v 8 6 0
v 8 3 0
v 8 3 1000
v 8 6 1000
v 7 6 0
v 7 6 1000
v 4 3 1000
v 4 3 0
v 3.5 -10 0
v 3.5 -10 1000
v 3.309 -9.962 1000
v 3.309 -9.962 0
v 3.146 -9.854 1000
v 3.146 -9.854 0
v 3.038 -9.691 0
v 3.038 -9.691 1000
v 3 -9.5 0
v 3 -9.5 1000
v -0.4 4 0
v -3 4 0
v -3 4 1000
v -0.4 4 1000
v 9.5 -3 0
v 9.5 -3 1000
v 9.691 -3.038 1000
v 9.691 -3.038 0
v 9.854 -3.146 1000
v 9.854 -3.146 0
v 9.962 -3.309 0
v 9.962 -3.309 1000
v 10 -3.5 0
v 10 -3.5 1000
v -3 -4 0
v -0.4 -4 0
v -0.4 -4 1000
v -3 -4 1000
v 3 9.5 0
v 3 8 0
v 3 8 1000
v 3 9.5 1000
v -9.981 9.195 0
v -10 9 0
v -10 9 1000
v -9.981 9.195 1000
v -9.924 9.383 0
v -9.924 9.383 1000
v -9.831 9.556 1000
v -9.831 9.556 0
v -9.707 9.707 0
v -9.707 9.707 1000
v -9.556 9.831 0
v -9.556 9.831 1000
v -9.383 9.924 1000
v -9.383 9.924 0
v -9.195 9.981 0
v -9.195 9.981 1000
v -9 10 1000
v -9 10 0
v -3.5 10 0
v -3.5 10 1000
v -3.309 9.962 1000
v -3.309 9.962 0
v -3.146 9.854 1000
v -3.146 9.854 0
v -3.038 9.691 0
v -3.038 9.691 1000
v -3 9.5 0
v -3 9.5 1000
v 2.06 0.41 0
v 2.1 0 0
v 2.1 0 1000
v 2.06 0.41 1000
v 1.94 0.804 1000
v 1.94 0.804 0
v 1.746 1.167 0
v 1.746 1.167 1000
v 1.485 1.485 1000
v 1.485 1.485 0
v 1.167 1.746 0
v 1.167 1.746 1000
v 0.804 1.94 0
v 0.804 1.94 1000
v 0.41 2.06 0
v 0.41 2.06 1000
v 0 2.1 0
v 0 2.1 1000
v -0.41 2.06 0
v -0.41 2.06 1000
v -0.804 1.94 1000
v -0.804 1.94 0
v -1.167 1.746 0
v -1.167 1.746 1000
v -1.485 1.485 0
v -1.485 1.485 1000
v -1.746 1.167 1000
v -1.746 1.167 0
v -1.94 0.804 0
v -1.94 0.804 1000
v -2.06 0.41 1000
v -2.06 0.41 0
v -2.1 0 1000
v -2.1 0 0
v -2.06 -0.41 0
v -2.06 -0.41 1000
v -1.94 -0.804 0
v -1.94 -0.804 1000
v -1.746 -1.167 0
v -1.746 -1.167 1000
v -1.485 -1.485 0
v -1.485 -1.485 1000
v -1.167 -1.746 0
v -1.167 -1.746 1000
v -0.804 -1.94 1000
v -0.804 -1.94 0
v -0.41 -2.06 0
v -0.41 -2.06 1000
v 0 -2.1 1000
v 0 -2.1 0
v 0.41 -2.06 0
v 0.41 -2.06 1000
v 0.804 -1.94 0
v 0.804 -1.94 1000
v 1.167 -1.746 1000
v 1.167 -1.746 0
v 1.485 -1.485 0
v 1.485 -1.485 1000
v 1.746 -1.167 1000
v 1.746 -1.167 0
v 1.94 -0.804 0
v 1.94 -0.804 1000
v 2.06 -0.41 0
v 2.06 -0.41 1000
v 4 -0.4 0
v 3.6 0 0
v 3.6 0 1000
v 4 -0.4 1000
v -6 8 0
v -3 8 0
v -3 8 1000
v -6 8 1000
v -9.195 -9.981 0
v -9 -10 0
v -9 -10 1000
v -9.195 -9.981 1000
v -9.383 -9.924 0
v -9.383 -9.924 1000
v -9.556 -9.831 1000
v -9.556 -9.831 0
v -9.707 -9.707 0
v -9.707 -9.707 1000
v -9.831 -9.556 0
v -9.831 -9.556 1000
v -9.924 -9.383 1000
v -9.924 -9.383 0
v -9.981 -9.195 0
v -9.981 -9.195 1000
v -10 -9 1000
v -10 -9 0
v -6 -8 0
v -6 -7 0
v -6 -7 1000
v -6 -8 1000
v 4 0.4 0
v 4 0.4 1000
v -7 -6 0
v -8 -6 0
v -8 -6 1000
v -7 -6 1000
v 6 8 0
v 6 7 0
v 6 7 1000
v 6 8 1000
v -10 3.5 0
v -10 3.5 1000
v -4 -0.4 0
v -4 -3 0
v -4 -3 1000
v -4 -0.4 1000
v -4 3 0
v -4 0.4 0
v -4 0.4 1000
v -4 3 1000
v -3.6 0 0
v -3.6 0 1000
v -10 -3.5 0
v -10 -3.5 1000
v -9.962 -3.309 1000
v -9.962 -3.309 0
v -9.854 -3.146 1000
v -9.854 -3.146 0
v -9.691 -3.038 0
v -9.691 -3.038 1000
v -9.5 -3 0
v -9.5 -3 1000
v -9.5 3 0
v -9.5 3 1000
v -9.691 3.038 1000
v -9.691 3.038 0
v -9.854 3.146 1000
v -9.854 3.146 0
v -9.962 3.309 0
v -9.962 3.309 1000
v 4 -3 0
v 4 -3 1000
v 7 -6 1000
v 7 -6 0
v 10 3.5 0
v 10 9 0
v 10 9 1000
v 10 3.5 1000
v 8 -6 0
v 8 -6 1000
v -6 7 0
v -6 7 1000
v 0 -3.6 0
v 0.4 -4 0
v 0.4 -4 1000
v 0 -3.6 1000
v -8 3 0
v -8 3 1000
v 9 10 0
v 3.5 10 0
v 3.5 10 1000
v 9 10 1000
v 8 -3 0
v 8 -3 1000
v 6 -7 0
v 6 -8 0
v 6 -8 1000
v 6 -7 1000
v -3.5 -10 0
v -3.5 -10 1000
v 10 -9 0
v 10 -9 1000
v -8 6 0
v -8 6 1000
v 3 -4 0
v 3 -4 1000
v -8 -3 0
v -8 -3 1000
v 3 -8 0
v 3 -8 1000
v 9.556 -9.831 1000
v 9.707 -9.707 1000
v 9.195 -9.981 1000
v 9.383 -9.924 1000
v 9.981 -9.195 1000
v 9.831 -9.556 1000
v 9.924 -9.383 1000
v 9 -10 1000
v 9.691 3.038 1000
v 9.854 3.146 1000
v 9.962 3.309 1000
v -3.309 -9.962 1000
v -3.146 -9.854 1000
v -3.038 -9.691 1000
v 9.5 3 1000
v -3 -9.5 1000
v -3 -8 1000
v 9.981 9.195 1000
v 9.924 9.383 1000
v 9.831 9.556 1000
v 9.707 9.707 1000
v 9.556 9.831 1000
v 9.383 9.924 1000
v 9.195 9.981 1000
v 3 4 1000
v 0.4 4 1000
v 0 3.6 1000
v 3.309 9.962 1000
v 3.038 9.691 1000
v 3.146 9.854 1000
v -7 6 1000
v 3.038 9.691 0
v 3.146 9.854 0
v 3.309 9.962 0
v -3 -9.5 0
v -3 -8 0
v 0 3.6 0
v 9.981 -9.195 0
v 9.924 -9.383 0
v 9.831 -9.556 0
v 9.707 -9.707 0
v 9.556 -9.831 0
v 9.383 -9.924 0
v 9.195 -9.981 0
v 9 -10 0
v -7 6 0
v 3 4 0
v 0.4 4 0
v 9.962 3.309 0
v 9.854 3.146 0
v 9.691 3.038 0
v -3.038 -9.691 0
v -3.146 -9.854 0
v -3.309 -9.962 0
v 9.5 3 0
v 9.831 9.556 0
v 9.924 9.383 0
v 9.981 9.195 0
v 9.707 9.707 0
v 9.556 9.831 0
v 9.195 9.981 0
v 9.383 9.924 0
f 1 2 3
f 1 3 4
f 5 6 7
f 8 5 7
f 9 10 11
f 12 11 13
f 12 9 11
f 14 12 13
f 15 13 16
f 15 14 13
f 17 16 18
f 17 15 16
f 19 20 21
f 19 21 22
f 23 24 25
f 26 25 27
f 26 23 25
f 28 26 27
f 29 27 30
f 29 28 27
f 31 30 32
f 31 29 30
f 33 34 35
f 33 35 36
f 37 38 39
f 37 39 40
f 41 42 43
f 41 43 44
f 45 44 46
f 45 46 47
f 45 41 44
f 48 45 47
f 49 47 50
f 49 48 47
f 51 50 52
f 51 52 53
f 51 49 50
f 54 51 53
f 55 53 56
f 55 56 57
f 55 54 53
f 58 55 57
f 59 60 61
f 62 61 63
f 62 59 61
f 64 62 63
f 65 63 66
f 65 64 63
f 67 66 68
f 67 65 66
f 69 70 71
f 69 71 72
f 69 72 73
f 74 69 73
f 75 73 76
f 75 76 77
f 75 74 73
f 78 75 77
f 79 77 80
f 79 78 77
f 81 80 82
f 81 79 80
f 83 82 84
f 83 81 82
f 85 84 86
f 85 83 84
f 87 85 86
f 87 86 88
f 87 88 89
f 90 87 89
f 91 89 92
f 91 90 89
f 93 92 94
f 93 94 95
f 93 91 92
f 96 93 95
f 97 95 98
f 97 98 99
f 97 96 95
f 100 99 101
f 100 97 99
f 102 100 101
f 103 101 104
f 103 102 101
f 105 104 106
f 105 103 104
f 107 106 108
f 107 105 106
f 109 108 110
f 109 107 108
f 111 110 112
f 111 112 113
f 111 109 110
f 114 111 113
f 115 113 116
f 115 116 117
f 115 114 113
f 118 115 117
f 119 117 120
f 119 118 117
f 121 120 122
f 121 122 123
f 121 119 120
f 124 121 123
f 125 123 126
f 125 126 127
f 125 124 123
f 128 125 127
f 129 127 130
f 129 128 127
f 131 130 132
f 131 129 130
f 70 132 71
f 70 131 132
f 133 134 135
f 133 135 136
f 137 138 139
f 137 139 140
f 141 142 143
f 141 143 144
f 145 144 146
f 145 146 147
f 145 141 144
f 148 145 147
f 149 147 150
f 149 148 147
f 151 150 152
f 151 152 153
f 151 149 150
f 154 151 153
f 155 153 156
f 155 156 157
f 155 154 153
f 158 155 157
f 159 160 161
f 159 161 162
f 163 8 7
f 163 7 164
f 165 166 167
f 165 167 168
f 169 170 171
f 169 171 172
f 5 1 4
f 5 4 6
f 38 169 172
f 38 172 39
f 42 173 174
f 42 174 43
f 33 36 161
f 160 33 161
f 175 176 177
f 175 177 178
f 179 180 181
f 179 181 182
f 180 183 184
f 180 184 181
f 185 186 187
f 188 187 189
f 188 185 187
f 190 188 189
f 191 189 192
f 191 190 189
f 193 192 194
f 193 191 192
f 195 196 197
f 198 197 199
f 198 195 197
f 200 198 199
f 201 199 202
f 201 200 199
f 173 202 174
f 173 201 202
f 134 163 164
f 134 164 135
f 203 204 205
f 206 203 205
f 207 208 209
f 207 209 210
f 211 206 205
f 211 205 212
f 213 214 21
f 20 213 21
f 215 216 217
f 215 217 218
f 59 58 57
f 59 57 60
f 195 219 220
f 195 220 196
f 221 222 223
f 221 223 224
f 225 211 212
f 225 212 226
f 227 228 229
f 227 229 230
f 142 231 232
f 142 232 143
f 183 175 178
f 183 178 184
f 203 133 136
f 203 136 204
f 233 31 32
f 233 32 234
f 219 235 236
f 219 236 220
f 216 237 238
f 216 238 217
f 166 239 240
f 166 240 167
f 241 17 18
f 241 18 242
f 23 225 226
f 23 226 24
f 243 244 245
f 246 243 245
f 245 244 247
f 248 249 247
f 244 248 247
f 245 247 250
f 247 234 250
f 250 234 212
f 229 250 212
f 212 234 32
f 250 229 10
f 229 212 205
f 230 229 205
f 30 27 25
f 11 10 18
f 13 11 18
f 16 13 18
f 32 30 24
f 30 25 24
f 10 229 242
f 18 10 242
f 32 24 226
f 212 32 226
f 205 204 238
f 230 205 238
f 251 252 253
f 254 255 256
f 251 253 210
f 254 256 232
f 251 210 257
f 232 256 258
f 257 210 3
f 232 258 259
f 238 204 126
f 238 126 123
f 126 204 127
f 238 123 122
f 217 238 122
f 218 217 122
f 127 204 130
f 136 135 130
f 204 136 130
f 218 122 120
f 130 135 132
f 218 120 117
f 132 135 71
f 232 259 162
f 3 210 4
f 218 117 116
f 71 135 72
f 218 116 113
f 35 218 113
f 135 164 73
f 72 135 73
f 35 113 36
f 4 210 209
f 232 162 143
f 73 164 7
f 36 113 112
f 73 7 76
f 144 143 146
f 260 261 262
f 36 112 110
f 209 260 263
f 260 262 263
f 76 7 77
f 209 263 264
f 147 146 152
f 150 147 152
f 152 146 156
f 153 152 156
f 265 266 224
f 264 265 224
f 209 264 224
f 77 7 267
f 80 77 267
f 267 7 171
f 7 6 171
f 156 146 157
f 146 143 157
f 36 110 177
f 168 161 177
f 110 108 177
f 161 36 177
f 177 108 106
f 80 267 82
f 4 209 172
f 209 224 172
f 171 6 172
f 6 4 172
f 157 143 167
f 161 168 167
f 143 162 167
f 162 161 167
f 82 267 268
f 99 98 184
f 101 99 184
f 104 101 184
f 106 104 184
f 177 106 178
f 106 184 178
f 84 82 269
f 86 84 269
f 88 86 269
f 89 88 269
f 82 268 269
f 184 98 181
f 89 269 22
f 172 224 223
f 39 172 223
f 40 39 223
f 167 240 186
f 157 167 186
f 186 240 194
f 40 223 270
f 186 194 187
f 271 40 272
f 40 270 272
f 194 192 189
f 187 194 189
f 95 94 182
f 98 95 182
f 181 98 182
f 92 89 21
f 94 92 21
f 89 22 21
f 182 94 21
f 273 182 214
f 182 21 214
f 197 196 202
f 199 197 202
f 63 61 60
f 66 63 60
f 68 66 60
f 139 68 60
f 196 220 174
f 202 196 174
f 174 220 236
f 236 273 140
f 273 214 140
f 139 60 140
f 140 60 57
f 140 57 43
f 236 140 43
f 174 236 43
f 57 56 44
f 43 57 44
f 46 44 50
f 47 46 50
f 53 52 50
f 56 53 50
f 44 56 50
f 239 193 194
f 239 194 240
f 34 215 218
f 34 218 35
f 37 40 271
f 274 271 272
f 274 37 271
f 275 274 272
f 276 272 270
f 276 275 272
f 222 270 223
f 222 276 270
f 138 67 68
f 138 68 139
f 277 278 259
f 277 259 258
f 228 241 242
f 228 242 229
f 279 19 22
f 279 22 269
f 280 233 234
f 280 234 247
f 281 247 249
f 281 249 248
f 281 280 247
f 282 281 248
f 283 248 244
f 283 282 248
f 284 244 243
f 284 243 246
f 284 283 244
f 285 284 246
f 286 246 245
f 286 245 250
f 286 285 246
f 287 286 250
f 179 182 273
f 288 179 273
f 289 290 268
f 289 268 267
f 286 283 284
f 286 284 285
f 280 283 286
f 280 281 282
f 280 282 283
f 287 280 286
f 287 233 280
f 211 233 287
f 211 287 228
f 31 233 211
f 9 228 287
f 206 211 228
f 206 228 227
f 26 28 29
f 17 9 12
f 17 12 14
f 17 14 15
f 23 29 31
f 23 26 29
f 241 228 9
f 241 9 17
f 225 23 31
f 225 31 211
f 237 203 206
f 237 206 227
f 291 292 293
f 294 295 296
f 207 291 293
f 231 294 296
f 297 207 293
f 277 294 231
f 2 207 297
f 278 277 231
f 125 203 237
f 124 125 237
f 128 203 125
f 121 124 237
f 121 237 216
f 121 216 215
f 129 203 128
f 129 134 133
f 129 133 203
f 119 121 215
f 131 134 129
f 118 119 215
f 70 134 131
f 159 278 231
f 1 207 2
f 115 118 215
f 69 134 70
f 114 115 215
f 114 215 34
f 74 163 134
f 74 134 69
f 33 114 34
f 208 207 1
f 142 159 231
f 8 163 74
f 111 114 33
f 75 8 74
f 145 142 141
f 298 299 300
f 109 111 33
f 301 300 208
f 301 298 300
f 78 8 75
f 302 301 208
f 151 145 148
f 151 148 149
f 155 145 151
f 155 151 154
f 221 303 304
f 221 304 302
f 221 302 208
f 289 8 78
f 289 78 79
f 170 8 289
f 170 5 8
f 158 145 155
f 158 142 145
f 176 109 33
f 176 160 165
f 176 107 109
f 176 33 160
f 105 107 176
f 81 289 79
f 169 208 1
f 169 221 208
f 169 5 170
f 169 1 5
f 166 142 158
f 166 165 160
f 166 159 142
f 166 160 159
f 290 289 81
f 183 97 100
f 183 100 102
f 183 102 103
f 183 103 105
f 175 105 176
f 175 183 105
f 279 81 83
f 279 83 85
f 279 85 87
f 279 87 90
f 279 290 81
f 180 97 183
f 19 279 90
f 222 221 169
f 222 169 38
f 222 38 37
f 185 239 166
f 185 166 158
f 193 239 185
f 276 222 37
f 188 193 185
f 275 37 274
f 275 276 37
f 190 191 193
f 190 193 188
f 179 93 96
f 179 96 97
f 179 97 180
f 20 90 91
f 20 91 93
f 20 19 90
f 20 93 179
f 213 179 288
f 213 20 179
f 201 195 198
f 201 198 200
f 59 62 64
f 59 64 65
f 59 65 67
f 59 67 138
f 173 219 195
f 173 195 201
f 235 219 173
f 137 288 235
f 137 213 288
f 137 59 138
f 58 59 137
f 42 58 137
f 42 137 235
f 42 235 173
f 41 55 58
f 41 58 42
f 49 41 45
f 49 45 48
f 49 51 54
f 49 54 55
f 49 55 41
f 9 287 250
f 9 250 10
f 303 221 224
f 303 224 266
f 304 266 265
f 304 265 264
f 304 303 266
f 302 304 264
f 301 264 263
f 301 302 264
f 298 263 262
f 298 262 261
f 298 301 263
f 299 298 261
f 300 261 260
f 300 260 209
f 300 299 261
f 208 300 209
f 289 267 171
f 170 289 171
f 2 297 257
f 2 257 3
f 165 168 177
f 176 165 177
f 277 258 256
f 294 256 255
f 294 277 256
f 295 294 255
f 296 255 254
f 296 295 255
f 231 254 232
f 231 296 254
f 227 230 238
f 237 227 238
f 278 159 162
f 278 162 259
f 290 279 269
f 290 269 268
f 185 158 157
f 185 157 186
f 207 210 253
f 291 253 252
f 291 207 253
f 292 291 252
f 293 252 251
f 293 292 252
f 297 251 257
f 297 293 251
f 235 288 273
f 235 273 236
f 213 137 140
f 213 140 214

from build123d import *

# Parameters (mm, degrees)
SCHIZZO1_R                   = 2.1
ESTRUSIONE_ESTRUSIONE1_DEPTH = 1000


with BuildPart() as part:
    # Schizzo1 → Estrusione-Estrusione1 (new body)
    with BuildSketch(Plane.XY):
        with BuildLine():
            Line((-3.6, 0), (-4, 0.4))
            Line((-4, 0.4), (-4, 3))
            Line((-4, 3), (-7, 6))
            Line((-7, 6), (-8, 6))
            Line((-8, 6), (-8, 3))
            Line((-8, 3), (-9.5, 3))
            ThreePointArc((-9.5, 3), (-9.853553391, 3.146446609), (-10, 3.5))
            Line((-10, 3.5), (-10, 9))
            ThreePointArc((-10, 9), (-9.707106781, 9.707106781), (-9, 10))
            Line((-9, 10), (-3.5, 10))
            ThreePointArc((-3.5, 10), (-3.146446609, 9.853553391), (-3, 9.5))
            Line((-3, 9.5), (-3, 8))
            Line((-3, 8), (-6, 8))
            Line((-6, 8), (-6, 7))
            Line((-6, 7), (-3, 4))
            Line((-3, 4), (-0.4, 4))
            Line((-0.4, 4), (0, 3.6))
            Line((0, 3.6), (0.4, 4))
            Line((0.4, 4), (3, 4))
            Line((3, 4), (6, 7))
            Line((6, 7), (6, 8))
            Line((6, 8), (3, 8))
            Line((3, 8), (3, 9.5))
            ThreePointArc((3, 9.5), (3.146446609, 9.853553391), (3.5, 10))
            Line((3.5, 10), (9, 10))
            ThreePointArc((9, 10), (9.707106781, 9.707106781), (10, 9))
            Line((10, 9), (10, 3.5))
            ThreePointArc((10, 3.5), (9.853553391, 3.146446609), (9.5, 3))
            Line((9.5, 3), (8, 3))
            Line((8, 3), (8, 6))
            Line((8, 6), (7, 6))
            Line((7, 6), (4, 3))
            Line((4, 3), (4, 0.4))
            Line((4, 0.4), (3.6, 0))
            Line((3.6, 0), (4, -0.4))
            Line((4, -0.4), (4, -3))
            Line((4, -3), (7, -6))
            Line((7, -6), (8, -6))
            Line((8, -6), (8, -3))
            Line((8, -3), (9.5, -3))
            ThreePointArc((9.5, -3), (9.853553391, -3.146446609), (10, -3.5))
            Line((10, -3.5), (10, -9))
            ThreePointArc((10, -9), (9.707106781, -9.707106781), (9, -10))
            Line((9, -10), (3.5, -10))
            ThreePointArc((3.5, -10), (3.146446609, -9.853553391), (3, -9.5))
            Line((3, -9.5), (3, -8))
            Line((3, -8), (6, -8))
            Line((6, -8), (6, -7))
            Line((6, -7), (3, -4))
            Line((3, -4), (0.4, -4))
            Line((0.4, -4), (0, -3.6))
            Line((0, -3.6), (-0.4, -4))
            Line((-0.4, -4), (-3, -4))
            Line((-3, -4), (-6, -7))
            Line((-6, -7), (-6, -8))
            Line((-6, -8), (-3, -8))
            Line((-3, -8), (-3, -9.5))
            ThreePointArc((-3, -9.5), (-3.146446609, -9.853553391), (-3.5, -10))
            Line((-3.5, -10), (-9, -10))
            ThreePointArc((-9, -10), (-9.707106781, -9.707106781), (-10, -9))
            Line((-10, -9), (-10, -3.5))
            ThreePointArc((-10, -3.5), (-9.853553391, -3.146446609), (-9.5, -3))
            Line((-9.5, -3), (-8, -3))
            Line((-8, -3), (-8, -6))
            Line((-8, -6), (-7, -6))
            Line((-7, -6), (-4, -3))
            Line((-4, -3), (-4, -0.4))
            Line((-4, -0.4), (-3.6, 0))
        make_face()
        Circle(SCHIZZO1_R, mode=Mode.SUBTRACT)
    extrude(amount=ESTRUSIONE_ESTRUSIONE1_DEPTH)


solid = part.part
